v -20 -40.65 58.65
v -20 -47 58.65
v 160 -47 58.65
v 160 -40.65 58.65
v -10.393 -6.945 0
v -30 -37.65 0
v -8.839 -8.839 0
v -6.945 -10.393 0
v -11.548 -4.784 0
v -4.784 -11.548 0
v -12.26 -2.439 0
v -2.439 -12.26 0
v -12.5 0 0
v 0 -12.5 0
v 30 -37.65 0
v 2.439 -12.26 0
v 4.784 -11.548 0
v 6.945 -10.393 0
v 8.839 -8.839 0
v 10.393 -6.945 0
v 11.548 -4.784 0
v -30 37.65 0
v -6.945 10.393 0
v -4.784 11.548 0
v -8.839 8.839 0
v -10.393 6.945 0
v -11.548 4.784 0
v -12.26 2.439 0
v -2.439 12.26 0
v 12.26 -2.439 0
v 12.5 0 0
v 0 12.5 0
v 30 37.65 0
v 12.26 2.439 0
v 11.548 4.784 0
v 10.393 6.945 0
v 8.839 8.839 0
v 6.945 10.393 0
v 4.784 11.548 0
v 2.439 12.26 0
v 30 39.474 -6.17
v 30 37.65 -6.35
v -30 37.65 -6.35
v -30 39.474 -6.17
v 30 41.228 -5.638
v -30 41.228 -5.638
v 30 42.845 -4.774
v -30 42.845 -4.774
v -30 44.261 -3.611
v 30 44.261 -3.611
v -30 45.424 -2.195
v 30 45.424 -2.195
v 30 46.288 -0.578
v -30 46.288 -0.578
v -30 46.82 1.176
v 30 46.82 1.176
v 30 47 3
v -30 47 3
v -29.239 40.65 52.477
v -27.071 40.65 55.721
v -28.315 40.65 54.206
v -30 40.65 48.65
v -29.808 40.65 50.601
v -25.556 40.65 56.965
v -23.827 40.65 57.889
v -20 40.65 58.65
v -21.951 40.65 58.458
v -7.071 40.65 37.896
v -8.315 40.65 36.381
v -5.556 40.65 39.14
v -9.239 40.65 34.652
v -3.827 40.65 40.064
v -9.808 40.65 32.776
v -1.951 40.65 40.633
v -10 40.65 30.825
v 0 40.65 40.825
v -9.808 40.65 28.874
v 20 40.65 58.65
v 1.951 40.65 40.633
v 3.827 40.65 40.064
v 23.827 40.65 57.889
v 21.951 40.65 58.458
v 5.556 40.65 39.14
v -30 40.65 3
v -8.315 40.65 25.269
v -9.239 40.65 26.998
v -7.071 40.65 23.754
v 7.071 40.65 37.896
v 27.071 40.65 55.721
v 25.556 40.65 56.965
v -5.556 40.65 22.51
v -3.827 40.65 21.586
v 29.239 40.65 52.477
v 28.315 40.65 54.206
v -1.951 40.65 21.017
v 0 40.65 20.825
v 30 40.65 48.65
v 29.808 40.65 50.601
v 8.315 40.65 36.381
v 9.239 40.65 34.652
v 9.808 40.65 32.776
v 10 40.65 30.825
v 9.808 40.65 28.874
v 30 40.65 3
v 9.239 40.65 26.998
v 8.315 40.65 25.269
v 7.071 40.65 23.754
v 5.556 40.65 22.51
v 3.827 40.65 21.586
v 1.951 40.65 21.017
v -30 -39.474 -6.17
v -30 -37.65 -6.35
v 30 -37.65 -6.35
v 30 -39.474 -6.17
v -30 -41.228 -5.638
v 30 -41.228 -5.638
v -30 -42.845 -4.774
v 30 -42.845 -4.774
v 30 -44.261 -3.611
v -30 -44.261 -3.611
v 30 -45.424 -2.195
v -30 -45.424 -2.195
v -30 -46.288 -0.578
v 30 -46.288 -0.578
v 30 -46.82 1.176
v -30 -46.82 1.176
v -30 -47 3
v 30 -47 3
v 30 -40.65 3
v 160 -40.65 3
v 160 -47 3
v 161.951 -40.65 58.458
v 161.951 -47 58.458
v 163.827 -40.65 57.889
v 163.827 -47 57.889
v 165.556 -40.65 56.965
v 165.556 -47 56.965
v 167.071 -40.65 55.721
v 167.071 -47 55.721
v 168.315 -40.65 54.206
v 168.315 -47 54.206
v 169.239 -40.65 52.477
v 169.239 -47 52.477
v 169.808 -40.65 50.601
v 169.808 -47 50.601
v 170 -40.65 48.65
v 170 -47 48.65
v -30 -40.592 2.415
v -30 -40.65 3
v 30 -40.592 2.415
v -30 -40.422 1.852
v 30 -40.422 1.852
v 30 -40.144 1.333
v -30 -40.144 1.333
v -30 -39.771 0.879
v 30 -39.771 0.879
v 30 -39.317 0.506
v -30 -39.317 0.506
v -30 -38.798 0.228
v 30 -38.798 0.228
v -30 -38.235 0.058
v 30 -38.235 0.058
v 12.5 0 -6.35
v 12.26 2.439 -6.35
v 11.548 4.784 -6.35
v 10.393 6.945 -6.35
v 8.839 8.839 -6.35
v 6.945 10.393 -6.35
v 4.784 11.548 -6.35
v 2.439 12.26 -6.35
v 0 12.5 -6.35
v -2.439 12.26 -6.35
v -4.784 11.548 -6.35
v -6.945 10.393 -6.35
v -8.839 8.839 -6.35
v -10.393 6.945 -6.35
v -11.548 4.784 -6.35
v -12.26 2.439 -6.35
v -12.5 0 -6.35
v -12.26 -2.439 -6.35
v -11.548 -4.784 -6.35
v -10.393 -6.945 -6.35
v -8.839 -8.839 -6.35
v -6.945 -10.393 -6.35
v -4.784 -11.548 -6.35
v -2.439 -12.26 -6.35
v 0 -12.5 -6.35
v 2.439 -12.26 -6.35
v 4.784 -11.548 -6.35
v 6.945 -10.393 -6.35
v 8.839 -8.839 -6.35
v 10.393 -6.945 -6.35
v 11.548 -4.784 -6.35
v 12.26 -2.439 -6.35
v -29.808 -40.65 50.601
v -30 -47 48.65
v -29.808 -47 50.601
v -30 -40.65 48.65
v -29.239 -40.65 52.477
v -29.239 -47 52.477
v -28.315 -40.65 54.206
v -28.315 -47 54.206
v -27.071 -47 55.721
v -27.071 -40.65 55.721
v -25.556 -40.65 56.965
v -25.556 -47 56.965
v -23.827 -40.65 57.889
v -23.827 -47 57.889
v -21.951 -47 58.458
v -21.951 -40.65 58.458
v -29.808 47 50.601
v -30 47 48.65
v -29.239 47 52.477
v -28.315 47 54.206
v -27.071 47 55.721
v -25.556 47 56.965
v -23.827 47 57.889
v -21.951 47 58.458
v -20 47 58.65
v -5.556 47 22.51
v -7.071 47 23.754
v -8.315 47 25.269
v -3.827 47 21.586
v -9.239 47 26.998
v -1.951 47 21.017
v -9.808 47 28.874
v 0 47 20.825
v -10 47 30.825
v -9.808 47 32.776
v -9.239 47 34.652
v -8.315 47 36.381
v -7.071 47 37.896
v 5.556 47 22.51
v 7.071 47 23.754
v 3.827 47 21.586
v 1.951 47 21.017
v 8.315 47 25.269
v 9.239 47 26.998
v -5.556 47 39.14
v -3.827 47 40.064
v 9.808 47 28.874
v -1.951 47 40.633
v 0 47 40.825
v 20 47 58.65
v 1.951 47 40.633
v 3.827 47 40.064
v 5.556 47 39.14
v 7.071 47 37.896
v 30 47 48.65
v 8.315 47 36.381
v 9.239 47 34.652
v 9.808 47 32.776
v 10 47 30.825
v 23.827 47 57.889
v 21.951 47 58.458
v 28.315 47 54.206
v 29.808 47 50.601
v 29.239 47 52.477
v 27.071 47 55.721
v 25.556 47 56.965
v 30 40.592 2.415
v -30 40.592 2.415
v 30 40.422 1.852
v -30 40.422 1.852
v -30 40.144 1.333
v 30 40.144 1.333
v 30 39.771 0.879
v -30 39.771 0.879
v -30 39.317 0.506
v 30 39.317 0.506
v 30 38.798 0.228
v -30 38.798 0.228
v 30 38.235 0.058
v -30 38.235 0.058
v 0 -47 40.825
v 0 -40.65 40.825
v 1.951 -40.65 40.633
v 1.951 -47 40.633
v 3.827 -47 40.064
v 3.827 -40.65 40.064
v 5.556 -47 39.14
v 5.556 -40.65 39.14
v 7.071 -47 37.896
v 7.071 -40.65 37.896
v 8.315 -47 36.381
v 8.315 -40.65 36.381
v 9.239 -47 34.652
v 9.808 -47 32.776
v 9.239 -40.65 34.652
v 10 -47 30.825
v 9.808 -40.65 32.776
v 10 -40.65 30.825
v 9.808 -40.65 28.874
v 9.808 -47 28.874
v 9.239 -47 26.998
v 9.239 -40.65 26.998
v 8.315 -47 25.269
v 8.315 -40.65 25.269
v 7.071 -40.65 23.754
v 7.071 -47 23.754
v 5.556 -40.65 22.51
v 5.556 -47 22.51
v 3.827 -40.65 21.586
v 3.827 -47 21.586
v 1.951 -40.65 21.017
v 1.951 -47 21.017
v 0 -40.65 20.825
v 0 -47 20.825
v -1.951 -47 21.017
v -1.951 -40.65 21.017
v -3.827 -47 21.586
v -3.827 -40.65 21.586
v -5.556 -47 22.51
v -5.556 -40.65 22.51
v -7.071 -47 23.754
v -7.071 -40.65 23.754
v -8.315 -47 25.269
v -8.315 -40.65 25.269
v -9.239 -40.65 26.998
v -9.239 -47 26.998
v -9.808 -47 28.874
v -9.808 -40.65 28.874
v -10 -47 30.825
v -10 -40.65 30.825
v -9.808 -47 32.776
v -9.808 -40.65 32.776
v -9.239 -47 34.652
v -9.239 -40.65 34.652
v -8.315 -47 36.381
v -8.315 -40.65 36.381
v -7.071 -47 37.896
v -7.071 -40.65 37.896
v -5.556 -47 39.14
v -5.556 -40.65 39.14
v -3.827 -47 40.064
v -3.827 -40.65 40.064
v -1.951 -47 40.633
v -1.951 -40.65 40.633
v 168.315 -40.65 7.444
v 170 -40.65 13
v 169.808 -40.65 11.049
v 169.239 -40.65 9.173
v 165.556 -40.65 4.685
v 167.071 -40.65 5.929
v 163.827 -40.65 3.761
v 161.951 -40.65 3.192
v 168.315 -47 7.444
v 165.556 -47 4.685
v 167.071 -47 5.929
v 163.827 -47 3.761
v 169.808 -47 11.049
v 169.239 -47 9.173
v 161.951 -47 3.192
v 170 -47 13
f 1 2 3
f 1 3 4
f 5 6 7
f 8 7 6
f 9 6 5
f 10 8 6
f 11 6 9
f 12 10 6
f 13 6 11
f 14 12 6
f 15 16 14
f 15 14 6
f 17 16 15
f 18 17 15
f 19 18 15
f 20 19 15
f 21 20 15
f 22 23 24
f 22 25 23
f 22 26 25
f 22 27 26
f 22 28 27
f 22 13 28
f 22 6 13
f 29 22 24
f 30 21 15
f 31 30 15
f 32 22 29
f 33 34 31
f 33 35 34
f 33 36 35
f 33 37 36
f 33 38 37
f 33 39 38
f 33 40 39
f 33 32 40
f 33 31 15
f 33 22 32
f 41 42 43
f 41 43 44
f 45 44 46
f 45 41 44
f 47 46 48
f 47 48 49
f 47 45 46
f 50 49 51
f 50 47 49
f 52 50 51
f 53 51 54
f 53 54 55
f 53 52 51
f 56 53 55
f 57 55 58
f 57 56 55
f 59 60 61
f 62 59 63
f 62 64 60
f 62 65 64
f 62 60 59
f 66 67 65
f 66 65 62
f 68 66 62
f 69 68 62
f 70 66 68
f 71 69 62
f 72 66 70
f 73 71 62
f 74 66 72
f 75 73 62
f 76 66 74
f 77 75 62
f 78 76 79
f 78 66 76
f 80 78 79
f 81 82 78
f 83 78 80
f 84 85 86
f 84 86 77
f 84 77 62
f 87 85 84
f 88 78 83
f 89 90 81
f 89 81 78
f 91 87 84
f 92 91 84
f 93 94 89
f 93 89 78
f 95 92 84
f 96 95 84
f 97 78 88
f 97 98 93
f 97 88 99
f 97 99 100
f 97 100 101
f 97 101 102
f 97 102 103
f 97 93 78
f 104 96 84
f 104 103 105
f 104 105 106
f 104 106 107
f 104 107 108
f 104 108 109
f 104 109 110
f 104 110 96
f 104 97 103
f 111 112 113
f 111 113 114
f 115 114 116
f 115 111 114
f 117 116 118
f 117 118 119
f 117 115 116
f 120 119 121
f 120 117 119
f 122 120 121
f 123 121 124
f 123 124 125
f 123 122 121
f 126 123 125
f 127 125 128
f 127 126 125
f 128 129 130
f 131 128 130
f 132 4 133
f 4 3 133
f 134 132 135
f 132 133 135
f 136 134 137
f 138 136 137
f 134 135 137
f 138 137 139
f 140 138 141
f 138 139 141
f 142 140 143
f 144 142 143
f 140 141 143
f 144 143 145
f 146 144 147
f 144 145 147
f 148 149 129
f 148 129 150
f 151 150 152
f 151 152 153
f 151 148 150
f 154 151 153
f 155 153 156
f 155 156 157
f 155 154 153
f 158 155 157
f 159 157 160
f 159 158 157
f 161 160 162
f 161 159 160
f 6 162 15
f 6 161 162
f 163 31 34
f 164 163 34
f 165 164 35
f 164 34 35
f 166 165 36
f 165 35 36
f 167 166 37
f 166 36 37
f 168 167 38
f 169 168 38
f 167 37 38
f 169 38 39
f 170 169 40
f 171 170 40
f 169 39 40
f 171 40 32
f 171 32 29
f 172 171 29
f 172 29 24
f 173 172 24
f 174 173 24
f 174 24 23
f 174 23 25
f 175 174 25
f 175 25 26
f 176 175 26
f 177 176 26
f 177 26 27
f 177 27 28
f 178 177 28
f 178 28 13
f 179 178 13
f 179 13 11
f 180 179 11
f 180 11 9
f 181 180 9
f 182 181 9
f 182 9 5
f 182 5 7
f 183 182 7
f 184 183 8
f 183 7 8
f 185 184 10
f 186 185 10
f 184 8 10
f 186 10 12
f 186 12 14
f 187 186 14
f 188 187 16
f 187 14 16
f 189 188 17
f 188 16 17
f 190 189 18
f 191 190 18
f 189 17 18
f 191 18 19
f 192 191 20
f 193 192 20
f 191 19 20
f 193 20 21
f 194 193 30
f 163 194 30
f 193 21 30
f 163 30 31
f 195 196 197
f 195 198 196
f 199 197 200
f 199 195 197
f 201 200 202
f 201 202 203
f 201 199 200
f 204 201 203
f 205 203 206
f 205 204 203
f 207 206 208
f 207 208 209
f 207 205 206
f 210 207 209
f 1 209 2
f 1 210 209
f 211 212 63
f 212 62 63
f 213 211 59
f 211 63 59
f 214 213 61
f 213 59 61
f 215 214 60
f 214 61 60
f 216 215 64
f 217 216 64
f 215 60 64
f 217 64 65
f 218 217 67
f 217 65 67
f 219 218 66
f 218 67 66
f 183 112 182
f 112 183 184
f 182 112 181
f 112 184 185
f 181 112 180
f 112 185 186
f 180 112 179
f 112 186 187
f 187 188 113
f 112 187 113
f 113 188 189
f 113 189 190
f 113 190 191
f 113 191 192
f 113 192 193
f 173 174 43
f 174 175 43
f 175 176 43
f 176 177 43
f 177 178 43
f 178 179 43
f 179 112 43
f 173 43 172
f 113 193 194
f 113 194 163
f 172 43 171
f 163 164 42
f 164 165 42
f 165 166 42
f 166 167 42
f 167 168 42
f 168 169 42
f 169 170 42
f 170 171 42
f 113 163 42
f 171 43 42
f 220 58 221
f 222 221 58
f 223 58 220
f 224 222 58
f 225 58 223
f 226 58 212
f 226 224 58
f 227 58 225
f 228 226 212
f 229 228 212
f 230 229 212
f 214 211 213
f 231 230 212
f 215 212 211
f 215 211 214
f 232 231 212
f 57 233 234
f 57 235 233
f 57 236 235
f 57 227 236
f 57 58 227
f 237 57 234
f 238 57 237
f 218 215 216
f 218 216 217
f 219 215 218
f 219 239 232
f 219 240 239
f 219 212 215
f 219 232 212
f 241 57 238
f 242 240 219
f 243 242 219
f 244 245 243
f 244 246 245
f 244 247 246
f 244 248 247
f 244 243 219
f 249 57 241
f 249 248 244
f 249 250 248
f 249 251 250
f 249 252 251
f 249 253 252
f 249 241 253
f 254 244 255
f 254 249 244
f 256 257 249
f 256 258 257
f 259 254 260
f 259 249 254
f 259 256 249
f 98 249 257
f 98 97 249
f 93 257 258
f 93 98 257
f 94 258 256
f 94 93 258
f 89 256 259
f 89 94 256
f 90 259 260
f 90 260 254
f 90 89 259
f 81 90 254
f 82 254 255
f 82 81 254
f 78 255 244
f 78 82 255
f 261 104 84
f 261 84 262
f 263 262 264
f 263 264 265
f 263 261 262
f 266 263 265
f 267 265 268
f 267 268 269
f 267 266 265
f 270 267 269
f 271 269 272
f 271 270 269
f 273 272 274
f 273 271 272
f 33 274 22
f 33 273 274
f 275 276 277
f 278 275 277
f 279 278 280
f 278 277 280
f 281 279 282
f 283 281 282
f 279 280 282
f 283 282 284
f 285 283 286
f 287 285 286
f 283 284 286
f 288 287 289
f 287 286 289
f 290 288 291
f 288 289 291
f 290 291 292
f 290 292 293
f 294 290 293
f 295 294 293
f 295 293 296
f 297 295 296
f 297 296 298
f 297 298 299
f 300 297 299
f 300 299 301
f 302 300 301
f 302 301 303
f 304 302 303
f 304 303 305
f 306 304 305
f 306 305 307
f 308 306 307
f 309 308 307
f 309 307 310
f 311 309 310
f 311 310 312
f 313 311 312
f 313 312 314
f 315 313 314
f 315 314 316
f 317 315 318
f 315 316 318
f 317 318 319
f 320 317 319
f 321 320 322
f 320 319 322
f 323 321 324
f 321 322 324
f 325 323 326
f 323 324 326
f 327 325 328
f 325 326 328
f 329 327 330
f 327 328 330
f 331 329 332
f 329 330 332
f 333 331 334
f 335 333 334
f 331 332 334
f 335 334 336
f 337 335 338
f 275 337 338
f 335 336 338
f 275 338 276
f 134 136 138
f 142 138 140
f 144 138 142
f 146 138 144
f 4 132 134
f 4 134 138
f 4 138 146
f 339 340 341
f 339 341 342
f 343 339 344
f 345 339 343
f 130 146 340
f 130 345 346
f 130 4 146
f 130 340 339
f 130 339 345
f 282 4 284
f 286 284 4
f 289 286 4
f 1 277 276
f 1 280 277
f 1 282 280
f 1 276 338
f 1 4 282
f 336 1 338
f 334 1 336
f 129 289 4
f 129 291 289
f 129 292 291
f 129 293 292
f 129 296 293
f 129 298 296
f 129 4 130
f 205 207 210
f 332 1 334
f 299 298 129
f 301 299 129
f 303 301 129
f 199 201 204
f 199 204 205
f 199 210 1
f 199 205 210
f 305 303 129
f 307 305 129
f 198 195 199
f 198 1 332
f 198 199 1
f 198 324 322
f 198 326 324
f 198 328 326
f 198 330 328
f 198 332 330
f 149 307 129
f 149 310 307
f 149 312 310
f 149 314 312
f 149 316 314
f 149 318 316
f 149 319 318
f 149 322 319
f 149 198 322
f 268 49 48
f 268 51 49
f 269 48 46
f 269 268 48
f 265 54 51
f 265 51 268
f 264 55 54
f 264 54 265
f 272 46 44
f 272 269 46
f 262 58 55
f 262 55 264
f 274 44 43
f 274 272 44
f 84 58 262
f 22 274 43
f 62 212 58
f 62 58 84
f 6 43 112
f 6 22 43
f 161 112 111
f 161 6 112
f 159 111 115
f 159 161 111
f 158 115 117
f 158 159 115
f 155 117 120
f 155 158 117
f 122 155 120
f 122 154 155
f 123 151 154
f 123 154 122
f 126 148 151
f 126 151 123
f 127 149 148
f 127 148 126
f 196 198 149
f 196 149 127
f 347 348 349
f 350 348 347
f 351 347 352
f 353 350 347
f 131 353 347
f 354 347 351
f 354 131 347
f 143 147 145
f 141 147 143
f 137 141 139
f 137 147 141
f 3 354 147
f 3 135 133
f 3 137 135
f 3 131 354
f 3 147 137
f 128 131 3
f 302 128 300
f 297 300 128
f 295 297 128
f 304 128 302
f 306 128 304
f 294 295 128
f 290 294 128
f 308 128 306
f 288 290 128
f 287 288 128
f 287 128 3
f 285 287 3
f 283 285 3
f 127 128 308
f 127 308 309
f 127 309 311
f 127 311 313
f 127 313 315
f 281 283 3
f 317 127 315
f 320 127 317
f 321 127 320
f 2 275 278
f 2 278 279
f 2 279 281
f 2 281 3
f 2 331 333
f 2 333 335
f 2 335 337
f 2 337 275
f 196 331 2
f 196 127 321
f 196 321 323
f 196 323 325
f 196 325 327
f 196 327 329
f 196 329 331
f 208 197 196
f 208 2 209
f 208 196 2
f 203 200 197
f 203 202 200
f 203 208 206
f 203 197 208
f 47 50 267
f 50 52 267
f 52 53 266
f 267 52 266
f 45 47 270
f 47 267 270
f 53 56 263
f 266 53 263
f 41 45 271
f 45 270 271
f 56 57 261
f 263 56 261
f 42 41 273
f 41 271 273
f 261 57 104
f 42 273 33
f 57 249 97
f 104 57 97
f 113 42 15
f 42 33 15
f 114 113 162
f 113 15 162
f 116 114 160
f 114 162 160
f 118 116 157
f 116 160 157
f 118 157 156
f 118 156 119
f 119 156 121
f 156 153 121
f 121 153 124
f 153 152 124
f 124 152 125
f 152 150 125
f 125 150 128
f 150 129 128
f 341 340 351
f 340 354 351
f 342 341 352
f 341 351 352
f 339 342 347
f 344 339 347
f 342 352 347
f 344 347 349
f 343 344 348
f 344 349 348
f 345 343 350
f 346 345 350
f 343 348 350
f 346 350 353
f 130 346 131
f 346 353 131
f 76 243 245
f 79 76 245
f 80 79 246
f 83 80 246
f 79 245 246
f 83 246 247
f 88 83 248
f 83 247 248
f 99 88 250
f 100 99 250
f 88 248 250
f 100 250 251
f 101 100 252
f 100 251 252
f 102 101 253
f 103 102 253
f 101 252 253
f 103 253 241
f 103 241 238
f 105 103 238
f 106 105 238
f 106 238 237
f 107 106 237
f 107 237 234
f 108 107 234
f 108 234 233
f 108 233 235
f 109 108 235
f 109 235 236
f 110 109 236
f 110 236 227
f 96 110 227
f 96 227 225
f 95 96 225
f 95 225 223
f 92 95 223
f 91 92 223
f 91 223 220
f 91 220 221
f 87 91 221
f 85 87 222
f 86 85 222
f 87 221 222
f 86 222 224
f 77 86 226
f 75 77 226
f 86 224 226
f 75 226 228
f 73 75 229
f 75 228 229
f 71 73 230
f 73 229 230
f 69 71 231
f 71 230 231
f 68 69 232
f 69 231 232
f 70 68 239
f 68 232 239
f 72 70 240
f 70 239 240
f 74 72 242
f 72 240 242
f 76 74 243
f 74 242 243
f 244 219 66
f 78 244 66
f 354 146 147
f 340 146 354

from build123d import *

# Parameters (mm, degrees)
SKETCH1_W                      = 60
SKETCH1_H                      = 94
BASE_FLANGE1_DEPTH             = 6.35
EDGE_FLANGE1_STRIP_W           = 31.4
EDGE_FLANGE1_STRIP_H           = 6.35
EDGE_FLANGE1_STRIP_CUT_DEPTH   = 60
EDGE_FLANGE1_STRIP_2_W         = 31.4
EDGE_FLANGE1_STRIP_2_H         = 6.35
EDGE_FLANGE1_STRIP_CUT_2_DEPTH = 60
EDGE_FLANGE1_DEPTH             = 60
EDGE_FLANGE1_BEND_DEPTH        = 60
SKETCH12_W                     = 200
SKETCH12_H                     = 55.65
TAB1_DEPTH                     = 6.35
FILLET2_R                      = 10
SKETCH14_R                     = 12.5
CUT_EXTRUDE1_DEPTH             = 186.873135498
SKETCH15_R                     = 10
CUT_EXTRUDE2_DEPTH             = 203.918265565


# Sheet-metal steps are written as plain solids
with BuildPart() as part:
    # Sketch1 → Base-Flange1 (new body)
    with BuildSketch(Plane.XY):
        Rectangle(SKETCH1_W, SKETCH1_H)
    extrude(amount=-BASE_FLANGE1_DEPTH)

    # Edge-Flange1 strip (across the edge) → Edge-Flange1 strip cut (cut)
    with BuildSketch(Plane(origin=(30, 47, 0), x_dir=(0, -1, 0), z_dir=(-1, 0, 0))):
        with Locations((-6.35, -3.175)):
            Rectangle(EDGE_FLANGE1_STRIP_W, EDGE_FLANGE1_STRIP_H)
    extrude(amount=EDGE_FLANGE1_STRIP_CUT_DEPTH, mode=Mode.SUBTRACT)

    # Edge-Flange1 strip 2 (across the edge) → Edge-Flange1 strip cut 2 (cut)
    with BuildSketch(Plane(origin=(-30, -47, 0), x_dir=(0, 1, 0), z_dir=(1, 0, 0))):
        with Locations((-6.35, -3.175)):
            Rectangle(EDGE_FLANGE1_STRIP_2_W, EDGE_FLANGE1_STRIP_2_H)
    extrude(amount=EDGE_FLANGE1_STRIP_CUT_2_DEPTH, mode=Mode.SUBTRACT)

    # Edge-Flange1 section (across the edge) → Edge-Flange1 (add)
    with BuildSketch(Plane(origin=(30, 47, 0), x_dir=(0, -1, 0), z_dir=(-1, 0, 0))):
        with BuildLine():
            Line((0, 3), (0, 58.65))
            Line((0, 58.65), (6.35, 58.65))
            Line((6.35, 58.65), (6.35, 3))
            ThreePointArc((6.35, 3), (7.228679656, 0.878679656), (9.35, 0))
            Line((9.35, 0), (9.35, -6.35))
            ThreePointArc((9.35, -6.35), (2.738551596, -3.611448404), (0, 3))
        make_face()
    extrude(amount=EDGE_FLANGE1_DEPTH)

    # Edge-Flange1 section 2 (across the edge) → Edge-Flange1 bend (add)
    with BuildSketch(Plane(origin=(-30, -47, 0), x_dir=(0, 1, 0), z_dir=(1, 0, 0))):
        with BuildLine():
            Line((0, 3), (0, 58.65))
            Line((0, 58.65), (6.35, 58.65))
            Line((6.35, 58.65), (6.35, 3))
            ThreePointArc((6.35, 3), (7.228679656, 0.878679656), (9.35, 0))
            Line((9.35, 0), (9.35, -6.35))
            ThreePointArc((9.35, -6.35), (2.738551596, -3.611448404), (0, 3))
        make_face()
    extrude(amount=EDGE_FLANGE1_BEND_DEPTH)

    # Sketch12 → Tab1 (add)
    with BuildSketch(Plane(origin=(0, -40.65, 0), x_dir=(1, 0, 0), z_dir=(0, 1, 0))):
        with Locations((70, -30.825)):
            Rectangle(SKETCH12_W, SKETCH12_H)
    extrude(amount=-TAB1_DEPTH)

    # Fillet2
    fillet2_edges = [part.edges().sort_by_distance(p)[0] for p in [
        (30, 43.825, 58.65),
        (-30, 43.825, 58.65),
        (-30, -43.825, 58.65),
        (170, -43.825, 58.65),
        (170, -43.825, 3),
    ]]
    fillet(fillet2_edges, radius=FILLET2_R)

    # Sketch14 → Cut-Extrude1 (cut, through all)
    with BuildSketch(Plane.XY):
        Circle(SKETCH14_R)
    extrude(amount=-CUT_EXTRUDE1_DEPTH, mode=Mode.SUBTRACT)

    # Sketch15 → Cut-Extrude2 (cut, through all)
    with BuildSketch(Plane(origin=(0, 47, 0), x_dir=(1, 0, 0), z_dir=(0, 1, 0))):
        with Locations(Location((0, -30.825, 0), (0, 0, 270))):
            Circle(SKETCH15_R)
    extrude(amount=-CUT_EXTRUDE2_DEPTH, mode=Mode.SUBTRACT)


solid = part.part
